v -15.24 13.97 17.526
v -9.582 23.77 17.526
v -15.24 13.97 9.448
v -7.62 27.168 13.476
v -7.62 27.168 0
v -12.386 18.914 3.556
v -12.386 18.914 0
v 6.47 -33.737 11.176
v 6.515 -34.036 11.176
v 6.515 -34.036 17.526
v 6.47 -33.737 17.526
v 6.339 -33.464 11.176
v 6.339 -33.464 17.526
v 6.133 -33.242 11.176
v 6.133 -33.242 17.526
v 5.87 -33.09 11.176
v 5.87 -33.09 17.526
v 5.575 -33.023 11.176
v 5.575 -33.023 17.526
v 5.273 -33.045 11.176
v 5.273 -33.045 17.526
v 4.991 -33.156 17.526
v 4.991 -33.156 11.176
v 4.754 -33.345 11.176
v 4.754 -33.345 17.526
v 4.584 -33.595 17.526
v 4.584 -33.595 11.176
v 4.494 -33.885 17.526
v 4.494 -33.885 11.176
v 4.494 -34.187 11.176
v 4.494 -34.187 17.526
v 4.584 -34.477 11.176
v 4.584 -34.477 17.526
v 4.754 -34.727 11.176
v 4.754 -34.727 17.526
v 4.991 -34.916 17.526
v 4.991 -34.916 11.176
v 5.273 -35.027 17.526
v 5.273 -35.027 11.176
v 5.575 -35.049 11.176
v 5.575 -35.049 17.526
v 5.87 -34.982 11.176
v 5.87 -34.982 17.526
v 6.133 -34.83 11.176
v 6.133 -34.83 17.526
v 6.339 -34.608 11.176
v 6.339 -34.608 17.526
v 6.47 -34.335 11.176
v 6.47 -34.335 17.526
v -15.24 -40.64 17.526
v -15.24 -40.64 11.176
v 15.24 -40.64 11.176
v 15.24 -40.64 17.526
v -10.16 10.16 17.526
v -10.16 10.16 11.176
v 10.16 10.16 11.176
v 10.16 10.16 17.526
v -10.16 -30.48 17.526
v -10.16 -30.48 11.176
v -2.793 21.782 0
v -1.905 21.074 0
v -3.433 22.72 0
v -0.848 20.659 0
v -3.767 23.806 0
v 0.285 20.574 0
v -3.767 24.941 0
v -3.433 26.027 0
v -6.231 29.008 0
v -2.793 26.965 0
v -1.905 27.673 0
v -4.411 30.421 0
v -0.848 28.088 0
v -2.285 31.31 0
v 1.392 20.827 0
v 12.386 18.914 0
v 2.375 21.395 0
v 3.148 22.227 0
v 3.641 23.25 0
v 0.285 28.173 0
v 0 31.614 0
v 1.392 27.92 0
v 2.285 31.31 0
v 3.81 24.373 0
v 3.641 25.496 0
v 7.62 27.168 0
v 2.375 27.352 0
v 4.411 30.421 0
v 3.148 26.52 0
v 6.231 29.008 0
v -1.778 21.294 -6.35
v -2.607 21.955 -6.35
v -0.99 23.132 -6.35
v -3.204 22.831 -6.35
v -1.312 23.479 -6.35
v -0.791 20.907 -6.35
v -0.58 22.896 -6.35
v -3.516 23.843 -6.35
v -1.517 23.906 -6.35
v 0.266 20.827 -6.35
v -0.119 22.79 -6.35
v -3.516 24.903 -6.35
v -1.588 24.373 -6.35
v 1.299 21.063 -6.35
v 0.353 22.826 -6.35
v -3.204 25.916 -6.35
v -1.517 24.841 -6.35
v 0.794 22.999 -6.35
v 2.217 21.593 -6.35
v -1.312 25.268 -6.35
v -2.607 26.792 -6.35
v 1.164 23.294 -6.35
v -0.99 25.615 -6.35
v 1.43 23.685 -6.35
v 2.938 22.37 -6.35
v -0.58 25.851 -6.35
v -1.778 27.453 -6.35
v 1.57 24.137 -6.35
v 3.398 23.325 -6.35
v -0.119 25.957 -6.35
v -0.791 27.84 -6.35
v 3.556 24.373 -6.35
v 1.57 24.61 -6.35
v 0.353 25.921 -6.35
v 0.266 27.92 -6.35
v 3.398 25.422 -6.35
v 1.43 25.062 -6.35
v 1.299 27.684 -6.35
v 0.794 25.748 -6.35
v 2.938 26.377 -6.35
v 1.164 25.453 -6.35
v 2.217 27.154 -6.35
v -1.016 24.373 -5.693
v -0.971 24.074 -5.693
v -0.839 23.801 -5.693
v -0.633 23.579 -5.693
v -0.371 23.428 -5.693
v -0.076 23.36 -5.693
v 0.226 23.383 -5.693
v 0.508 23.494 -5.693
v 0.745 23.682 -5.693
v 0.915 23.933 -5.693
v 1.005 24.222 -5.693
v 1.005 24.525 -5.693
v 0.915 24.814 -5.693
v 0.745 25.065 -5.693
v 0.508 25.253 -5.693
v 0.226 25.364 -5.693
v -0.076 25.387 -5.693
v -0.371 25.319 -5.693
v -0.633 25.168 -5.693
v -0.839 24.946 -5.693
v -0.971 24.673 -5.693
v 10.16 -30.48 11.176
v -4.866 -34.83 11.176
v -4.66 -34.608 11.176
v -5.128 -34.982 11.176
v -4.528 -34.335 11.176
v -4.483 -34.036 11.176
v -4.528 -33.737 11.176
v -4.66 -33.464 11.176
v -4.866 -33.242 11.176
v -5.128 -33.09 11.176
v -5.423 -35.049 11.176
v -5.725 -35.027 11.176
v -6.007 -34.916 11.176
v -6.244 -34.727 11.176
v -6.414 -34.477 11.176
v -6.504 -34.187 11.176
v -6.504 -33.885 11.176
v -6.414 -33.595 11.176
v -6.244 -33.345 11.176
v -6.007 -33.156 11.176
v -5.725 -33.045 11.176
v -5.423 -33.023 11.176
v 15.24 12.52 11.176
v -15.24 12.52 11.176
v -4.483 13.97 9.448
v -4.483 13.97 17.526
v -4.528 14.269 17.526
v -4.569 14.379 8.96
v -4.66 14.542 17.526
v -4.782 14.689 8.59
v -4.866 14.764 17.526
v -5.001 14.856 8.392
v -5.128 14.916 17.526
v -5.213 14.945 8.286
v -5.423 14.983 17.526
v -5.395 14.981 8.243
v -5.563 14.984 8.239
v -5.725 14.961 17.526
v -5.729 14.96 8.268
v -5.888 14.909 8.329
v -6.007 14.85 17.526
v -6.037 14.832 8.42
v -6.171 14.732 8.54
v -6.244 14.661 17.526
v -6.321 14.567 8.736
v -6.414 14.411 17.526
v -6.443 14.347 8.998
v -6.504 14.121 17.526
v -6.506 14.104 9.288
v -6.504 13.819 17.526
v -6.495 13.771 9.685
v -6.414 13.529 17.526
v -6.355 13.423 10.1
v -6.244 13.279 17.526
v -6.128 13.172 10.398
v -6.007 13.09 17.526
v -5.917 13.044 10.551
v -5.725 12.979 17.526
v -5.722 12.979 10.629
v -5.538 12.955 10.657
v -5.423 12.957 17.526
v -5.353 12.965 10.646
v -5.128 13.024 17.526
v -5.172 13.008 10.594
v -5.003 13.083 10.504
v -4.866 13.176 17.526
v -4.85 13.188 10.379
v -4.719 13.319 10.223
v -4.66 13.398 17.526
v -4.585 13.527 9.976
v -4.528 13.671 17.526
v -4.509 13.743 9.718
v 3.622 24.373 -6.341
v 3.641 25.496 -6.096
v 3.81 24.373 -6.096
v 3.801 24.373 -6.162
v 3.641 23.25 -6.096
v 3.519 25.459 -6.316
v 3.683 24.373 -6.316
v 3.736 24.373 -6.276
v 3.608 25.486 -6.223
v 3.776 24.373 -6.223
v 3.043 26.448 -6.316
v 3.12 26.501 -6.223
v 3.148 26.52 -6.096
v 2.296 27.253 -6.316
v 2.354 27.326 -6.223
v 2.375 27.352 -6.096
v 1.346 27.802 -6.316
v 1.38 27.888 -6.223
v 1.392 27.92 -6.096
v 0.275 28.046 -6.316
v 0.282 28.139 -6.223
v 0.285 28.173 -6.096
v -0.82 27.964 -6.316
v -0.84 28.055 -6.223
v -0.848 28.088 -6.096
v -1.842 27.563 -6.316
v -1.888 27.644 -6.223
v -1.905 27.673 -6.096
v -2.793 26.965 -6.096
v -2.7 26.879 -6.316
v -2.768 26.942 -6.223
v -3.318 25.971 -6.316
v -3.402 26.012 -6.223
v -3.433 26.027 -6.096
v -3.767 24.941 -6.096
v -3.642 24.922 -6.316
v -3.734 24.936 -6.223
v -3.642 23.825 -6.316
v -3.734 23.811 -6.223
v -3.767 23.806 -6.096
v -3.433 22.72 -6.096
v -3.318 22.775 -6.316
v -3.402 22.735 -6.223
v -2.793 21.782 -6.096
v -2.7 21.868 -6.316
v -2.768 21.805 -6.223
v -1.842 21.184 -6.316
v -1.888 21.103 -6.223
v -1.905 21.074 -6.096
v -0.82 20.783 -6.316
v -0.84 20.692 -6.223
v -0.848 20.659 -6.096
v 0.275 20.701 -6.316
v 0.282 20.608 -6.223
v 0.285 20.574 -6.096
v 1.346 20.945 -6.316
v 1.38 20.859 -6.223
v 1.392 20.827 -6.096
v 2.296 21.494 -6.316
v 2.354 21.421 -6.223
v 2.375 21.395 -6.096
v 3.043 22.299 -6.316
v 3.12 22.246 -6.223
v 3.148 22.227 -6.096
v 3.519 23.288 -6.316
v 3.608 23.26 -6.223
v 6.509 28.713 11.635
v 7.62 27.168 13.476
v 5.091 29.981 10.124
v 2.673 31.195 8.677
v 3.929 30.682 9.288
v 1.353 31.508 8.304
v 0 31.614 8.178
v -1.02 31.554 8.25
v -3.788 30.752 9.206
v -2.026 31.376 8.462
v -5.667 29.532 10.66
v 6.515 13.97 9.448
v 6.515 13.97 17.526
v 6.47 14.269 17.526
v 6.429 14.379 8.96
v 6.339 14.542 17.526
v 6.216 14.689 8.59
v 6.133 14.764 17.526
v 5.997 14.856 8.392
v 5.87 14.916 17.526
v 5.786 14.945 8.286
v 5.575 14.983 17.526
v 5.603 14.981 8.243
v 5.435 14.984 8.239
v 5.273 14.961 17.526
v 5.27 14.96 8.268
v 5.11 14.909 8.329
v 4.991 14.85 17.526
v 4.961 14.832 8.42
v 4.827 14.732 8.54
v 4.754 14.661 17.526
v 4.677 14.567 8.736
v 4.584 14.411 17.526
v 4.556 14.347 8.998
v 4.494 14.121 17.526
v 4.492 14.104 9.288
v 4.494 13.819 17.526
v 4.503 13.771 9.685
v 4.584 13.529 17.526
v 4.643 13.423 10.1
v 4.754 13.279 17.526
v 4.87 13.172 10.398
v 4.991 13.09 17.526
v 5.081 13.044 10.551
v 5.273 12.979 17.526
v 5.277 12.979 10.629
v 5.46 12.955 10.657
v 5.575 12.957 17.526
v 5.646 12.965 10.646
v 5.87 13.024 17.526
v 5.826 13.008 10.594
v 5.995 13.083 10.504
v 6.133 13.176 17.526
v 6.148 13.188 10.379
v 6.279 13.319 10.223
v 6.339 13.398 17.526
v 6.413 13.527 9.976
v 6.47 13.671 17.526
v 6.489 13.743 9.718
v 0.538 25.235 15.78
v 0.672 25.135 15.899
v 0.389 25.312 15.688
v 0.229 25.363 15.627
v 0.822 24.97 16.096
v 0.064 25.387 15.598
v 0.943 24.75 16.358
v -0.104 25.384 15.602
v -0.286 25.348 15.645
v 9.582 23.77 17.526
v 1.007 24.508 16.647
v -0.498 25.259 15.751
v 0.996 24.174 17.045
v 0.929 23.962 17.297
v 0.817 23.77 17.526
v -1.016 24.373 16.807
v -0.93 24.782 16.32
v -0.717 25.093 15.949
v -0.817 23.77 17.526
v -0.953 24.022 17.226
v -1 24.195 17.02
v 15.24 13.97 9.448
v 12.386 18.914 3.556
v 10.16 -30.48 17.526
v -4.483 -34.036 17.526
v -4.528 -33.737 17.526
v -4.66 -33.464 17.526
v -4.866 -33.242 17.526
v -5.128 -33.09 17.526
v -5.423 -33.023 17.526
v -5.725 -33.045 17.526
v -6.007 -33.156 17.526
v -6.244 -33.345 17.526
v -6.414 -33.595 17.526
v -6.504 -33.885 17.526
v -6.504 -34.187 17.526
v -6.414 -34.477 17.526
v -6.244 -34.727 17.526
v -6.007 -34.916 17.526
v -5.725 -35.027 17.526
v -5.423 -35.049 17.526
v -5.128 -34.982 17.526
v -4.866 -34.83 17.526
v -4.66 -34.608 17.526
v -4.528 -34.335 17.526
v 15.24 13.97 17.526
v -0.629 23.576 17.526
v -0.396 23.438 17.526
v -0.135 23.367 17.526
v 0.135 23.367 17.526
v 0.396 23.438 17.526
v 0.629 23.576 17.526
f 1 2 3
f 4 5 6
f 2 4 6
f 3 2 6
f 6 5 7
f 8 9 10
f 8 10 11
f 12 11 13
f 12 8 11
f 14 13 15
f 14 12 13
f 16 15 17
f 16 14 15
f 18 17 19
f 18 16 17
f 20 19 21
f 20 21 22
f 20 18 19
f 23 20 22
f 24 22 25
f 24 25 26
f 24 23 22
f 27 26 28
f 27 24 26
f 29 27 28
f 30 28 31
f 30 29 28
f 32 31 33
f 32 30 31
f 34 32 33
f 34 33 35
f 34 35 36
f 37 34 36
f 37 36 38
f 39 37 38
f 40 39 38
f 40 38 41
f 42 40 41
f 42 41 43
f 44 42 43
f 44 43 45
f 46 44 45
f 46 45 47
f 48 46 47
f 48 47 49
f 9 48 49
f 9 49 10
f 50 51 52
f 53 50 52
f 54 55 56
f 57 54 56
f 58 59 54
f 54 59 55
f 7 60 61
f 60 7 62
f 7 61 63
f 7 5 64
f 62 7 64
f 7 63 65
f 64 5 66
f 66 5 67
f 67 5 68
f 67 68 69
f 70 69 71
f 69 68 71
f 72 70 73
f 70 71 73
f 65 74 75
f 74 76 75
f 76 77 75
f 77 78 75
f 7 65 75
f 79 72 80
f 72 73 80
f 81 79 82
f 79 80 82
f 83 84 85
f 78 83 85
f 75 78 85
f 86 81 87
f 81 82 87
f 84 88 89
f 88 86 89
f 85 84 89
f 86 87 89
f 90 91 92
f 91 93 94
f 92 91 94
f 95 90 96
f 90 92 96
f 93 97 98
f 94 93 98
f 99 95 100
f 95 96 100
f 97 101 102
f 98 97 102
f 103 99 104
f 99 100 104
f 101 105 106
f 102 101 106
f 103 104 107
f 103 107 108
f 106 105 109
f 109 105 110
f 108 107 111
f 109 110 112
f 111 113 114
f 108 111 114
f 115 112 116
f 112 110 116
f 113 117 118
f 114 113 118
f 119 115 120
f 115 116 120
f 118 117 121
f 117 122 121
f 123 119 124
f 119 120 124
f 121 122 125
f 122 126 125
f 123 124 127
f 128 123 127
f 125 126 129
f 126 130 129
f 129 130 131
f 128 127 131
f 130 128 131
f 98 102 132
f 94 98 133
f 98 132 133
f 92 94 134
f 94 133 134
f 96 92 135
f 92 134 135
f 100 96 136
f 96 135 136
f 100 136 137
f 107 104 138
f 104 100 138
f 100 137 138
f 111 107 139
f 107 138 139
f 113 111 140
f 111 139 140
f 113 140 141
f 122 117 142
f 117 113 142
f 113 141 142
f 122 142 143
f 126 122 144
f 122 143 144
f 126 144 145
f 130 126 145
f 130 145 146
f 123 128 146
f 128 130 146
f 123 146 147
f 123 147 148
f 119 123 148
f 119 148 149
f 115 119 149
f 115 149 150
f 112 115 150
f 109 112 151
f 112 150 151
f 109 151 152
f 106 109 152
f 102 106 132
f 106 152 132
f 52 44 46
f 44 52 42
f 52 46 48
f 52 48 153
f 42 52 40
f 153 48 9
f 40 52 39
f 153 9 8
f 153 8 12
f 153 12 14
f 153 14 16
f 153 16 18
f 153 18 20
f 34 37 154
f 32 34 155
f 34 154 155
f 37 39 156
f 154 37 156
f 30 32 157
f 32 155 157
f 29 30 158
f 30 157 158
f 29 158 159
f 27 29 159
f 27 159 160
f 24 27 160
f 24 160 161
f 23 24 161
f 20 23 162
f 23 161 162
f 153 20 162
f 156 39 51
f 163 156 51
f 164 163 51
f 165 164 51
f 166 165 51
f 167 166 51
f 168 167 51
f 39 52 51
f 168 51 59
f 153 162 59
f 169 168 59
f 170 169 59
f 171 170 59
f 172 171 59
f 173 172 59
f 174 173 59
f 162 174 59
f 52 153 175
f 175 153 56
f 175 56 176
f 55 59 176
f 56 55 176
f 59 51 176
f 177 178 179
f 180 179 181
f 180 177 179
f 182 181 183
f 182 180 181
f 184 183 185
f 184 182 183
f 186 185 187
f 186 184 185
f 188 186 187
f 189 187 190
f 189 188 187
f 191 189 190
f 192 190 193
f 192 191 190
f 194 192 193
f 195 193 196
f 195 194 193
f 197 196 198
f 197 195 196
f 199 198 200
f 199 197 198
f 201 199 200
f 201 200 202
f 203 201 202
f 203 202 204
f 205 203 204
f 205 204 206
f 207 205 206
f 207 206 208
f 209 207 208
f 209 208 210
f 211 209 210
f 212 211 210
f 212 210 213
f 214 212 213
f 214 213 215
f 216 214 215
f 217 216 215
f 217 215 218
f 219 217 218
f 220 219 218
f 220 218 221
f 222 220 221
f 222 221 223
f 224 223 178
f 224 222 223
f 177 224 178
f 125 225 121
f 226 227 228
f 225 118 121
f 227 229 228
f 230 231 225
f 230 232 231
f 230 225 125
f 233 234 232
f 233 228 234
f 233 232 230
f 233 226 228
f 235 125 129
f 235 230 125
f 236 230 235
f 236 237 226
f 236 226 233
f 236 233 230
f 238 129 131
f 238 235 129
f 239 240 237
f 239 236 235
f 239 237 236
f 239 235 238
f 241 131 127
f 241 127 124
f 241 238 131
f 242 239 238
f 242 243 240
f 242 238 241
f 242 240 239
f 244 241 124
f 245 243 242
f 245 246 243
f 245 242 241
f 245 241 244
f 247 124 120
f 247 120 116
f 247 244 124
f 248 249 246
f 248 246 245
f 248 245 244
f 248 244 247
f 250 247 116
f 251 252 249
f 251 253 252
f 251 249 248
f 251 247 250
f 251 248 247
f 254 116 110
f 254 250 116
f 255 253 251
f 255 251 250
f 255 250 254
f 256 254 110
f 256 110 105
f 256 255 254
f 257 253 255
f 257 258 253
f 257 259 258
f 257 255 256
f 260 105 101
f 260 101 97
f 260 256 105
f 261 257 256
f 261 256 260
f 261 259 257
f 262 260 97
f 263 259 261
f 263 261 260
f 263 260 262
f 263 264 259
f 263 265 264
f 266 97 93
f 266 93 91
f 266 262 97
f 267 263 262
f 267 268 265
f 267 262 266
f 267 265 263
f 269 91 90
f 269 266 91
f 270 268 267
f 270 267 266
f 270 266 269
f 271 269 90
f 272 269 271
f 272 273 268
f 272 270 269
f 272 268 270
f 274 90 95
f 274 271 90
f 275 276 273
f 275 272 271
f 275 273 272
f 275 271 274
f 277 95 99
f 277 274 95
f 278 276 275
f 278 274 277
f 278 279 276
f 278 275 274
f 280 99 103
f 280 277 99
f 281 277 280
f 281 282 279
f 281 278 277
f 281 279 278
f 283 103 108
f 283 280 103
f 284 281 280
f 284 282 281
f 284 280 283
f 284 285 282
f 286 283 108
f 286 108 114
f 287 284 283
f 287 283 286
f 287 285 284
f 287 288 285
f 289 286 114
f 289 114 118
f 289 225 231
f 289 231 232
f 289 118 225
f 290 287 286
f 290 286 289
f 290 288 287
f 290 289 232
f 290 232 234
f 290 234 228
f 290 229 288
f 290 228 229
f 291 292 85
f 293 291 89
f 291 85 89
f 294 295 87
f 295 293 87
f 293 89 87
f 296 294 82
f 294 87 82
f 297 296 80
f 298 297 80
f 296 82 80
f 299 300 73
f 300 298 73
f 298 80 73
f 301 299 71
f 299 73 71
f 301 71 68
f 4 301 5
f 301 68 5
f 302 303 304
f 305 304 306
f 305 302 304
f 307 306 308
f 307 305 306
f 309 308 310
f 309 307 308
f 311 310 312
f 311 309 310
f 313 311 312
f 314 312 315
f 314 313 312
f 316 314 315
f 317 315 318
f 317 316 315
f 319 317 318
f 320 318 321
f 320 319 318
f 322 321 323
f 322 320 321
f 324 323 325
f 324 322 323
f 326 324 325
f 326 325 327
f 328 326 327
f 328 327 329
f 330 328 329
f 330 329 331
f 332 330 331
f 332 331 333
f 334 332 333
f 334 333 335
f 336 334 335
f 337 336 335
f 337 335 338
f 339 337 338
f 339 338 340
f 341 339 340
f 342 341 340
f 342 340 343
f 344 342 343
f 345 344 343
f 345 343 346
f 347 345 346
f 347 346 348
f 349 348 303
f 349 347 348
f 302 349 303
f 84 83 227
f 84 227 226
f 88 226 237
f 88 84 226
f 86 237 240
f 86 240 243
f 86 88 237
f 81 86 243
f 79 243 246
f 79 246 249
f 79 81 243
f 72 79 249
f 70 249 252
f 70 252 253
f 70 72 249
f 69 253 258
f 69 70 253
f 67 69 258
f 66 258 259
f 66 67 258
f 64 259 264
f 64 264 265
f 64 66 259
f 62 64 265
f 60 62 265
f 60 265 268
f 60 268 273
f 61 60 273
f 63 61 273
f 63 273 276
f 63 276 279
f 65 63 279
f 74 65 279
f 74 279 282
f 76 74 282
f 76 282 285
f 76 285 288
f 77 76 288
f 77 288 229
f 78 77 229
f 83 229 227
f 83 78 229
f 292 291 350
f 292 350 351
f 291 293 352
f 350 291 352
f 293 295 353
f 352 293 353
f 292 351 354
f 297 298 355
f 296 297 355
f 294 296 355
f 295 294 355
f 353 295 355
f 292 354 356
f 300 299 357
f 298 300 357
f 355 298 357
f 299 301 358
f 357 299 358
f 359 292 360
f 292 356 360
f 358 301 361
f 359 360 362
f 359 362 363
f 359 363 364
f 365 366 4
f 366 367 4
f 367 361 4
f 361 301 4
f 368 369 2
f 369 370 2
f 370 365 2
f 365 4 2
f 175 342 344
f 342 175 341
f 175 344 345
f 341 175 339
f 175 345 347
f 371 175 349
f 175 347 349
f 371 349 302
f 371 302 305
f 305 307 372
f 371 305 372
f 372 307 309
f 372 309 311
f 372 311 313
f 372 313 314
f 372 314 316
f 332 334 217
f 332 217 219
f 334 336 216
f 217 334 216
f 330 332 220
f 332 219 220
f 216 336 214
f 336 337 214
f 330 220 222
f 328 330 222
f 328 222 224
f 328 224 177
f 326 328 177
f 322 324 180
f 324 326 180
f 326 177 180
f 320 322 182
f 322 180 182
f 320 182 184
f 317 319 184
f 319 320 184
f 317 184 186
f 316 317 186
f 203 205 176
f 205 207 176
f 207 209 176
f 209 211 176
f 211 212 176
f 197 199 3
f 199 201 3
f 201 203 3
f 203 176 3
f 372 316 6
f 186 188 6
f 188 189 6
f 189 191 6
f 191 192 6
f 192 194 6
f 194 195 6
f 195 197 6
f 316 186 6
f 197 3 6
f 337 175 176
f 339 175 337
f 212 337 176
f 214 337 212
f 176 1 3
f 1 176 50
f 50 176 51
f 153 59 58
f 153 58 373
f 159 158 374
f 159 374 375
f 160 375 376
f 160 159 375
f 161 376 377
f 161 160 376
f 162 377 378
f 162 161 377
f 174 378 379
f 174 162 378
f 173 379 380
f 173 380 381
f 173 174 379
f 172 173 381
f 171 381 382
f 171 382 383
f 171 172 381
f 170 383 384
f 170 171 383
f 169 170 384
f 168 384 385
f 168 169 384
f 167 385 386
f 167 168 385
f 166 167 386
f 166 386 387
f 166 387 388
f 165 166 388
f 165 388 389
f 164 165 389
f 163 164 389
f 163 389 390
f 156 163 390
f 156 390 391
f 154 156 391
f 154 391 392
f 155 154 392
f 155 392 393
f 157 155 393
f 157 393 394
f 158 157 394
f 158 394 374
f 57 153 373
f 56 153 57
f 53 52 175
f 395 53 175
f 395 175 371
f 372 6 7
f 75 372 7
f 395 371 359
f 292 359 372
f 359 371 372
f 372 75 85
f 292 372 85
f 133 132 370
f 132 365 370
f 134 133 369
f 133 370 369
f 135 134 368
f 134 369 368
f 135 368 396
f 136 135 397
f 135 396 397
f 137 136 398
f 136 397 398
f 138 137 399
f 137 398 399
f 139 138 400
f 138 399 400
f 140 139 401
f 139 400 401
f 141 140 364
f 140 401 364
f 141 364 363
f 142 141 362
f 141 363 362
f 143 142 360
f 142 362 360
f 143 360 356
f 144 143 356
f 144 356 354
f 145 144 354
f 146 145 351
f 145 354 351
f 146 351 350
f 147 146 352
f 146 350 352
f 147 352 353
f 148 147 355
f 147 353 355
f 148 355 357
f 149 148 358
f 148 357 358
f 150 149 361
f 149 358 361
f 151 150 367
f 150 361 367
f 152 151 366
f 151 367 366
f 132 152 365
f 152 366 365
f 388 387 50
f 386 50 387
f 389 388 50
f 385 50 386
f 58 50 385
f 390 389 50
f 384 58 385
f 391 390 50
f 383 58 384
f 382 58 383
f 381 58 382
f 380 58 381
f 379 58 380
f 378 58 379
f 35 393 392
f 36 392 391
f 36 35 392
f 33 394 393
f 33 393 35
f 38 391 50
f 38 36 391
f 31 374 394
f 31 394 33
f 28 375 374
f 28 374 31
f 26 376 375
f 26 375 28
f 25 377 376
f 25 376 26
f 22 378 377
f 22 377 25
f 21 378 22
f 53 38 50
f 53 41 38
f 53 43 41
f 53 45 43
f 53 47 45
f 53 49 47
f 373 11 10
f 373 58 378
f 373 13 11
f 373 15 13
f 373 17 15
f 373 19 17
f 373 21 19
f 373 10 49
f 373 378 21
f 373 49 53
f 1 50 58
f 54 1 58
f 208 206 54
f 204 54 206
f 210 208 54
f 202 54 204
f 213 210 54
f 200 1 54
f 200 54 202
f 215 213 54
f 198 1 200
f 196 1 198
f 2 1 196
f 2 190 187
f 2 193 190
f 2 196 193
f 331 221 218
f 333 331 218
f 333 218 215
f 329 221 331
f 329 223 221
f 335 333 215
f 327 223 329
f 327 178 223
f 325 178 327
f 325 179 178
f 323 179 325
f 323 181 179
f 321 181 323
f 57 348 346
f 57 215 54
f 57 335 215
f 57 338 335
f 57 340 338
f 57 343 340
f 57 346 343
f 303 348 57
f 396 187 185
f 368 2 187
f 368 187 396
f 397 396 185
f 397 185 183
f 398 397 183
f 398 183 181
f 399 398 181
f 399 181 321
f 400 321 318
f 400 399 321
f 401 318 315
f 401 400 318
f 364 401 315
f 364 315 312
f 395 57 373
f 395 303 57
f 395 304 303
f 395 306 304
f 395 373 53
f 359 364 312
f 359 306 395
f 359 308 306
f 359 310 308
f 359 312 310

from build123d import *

# Parameters (mm, degrees)
F0_R           = 1.016
F0_W           = 20.32
F0_H           = 40.64
F2_DEPTH       = 17.526
F3_START       = -25.4
F3_DEPTH       = 40.641
F4_R           = 3.81
F5_DEPTH       = 6.35
F7_D           = 2.032
F7_CSINK_D     = 3.175
F7_CSINK_ANGLE = 82
F8_R           = 0.254


with BuildPart() as f2:
    # F0 (on Top) → F2 (new body, through all)
    with BuildSketch(Plane.XY):
        with BuildLine():
            Line((-15.24, -40.64), (15.24, -40.64))
            Line((15.24, -40.64), (15.24, 13.97))
            Line((15.24, 13.97), (7.62, 27.1682271537))
            ThreePointArc((7.62, 27.1682271537), (0, 31.6135833353), (-7.62, 27.1682271537))
            Line((-7.62, 27.1682271537), (-15.24, 13.97))
            Line((-15.24, 13.97), (-15.24, -40.64))
        make_face()
        with Locations((-5.4991, -34.036)):
            Circle(F0_R, mode=Mode.SUBTRACT)
        with Locations((5.4991, -34.036)):
            Circle(F0_R, mode=Mode.SUBTRACT)
        with Locations((0, -10.16)):
            Rectangle(F0_W, F0_H, mode=Mode.SUBTRACT)
        with Locations((-5.4991, 13.97)):
            Circle(F0_R, mode=Mode.SUBTRACT)
        with Locations((5.4991, 13.97)):
            Circle(F0_R, mode=Mode.SUBTRACT)
    extrude(amount=F2_DEPTH)

    # F1 (on Right) → F3 (intersect)
    with BuildSketch(Plane.YZ.offset(F3_START)):
        Polygon((18.9135833353, 3.556), (18.9135833353, 0), (31.6135833353, 0), (31.6135833353, 8.1784219752), (23.7700340623, 17.526), (-40.64, 17.526), (-40.64, 11.176), (12.5196441457, 11.176), align=None)
    extrude(amount=F3_DEPTH, mode=Mode.INTERSECT)

    # F4 (on face) → F5 (join)
    with BuildSketch(Plane.XY):
        with Locations((0, 24.3734540549)):
            Circle(F4_R)
    extrude(amount=-F5_DEPTH)

    # F7 (through all)
    with Locations(Plane(origin=(0, 0, -6.35), x_dir=(1, 0, 0), z_dir=(0, 0, -1))):
        with Locations((0, -24.3734540549)):
            CounterSinkHole(F7_D / 2, F7_CSINK_D / 2, counter_sink_angle=F7_CSINK_ANGLE)

    # F8
    f8_edges = [f2.edges().sort_by_distance(p)[0] for p in [
        (-3.81, 24.373454, -6.35),
    ]]
    fillet(f8_edges, radius=F8_R)


solid = f2.part
